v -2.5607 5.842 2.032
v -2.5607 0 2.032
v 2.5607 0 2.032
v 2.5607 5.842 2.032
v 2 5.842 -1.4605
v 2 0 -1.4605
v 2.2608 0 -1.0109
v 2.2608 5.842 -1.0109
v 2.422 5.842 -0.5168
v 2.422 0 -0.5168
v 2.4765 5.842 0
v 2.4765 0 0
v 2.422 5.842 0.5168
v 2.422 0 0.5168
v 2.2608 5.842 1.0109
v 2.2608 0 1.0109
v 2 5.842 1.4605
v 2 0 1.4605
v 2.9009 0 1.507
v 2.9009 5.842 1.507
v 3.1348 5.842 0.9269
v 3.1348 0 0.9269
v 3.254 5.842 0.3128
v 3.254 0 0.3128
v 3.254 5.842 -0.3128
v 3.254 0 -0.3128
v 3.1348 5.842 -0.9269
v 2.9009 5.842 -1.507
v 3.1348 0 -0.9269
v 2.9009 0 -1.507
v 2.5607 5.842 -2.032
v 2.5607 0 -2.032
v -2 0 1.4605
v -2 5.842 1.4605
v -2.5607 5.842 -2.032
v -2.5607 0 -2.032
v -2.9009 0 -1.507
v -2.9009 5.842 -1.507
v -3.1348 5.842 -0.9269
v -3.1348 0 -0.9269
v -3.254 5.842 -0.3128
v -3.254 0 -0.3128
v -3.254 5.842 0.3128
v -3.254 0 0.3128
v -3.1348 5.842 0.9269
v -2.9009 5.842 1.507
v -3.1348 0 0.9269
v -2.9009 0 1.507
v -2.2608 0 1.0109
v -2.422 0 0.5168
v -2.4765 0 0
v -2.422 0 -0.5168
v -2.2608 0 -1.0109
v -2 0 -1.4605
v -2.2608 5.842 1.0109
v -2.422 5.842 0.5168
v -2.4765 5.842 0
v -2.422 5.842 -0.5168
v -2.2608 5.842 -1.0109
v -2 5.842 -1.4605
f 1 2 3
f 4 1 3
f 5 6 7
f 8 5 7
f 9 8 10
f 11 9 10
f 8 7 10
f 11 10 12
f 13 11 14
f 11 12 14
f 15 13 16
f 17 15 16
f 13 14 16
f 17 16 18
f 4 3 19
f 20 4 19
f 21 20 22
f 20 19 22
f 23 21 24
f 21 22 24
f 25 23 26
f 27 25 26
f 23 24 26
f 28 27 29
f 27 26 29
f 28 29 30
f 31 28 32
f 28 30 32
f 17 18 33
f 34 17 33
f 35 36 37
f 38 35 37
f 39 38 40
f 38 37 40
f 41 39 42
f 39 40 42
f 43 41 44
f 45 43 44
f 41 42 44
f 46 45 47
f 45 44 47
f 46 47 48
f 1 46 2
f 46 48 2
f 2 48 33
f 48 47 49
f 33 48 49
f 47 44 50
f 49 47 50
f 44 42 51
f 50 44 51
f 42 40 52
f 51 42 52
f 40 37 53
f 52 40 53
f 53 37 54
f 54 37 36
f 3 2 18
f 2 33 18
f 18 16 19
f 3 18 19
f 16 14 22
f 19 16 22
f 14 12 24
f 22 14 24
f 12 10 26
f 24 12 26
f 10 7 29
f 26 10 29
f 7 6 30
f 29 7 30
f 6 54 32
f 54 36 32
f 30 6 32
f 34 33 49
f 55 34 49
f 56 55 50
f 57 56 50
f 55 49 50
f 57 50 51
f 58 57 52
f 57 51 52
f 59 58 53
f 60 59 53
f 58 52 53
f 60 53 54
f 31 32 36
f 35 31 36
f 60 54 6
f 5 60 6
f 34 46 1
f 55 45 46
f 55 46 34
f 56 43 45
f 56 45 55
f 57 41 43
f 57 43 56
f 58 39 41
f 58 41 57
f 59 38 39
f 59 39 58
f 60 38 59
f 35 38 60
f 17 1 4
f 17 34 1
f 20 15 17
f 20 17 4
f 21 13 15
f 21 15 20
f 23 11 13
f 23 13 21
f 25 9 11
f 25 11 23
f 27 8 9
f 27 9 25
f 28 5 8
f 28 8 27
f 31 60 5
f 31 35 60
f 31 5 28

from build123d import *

# Parameters (mm, degrees)
BOSS_EXTRUDE1_DEPTH = 5.842


with BuildPart() as part:
    # Sketch1 → Boss-Extrude1 (new body)
    with BuildSketch(Plane(origin=(0, 0, 0), x_dir=(1, 0, 0), z_dir=(0, 1, 0))):
        with BuildLine():
            Line((-2.4765, -2.032), (2.4765, -2.032))
            Line((2.4765, -2.032), (2.560704247, -2.032))
            ThreePointArc((2.560704247, -2.032), (3.26898, 0), (2.560704247, 2.032))
            Line((2.560704247, 2.032), (2.419800194, 2.032))
            Line((2.419800194, 2.032), (-2.533199806, 2.032))
            Line((-2.533199806, 2.032), (-2.560704247, 2.032))
            ThreePointArc((-2.560704247, 2.032), (-3.26898, 0), (-2.560704247, -2.032))
            Line((-2.560704247, -2.032), (-2.4765, -2.032))
        make_face()
        with BuildLine():
            Line((1.999998, -1.4605), (-1.999998, -1.4605))
            ThreePointArc((-1.999998, -1.4605), (-2.4765, 0), (-1.999998, 1.4605))
            Line((-1.999998, 1.4605), (1.999998, 1.4605))
            ThreePointArc((1.999998, 1.4605), (2.4765, 0), (1.999998, -1.4605))
        make_face(mode=Mode.SUBTRACT)
    extrude(amount=BOSS_EXTRUDE1_DEPTH)


solid = part.part
